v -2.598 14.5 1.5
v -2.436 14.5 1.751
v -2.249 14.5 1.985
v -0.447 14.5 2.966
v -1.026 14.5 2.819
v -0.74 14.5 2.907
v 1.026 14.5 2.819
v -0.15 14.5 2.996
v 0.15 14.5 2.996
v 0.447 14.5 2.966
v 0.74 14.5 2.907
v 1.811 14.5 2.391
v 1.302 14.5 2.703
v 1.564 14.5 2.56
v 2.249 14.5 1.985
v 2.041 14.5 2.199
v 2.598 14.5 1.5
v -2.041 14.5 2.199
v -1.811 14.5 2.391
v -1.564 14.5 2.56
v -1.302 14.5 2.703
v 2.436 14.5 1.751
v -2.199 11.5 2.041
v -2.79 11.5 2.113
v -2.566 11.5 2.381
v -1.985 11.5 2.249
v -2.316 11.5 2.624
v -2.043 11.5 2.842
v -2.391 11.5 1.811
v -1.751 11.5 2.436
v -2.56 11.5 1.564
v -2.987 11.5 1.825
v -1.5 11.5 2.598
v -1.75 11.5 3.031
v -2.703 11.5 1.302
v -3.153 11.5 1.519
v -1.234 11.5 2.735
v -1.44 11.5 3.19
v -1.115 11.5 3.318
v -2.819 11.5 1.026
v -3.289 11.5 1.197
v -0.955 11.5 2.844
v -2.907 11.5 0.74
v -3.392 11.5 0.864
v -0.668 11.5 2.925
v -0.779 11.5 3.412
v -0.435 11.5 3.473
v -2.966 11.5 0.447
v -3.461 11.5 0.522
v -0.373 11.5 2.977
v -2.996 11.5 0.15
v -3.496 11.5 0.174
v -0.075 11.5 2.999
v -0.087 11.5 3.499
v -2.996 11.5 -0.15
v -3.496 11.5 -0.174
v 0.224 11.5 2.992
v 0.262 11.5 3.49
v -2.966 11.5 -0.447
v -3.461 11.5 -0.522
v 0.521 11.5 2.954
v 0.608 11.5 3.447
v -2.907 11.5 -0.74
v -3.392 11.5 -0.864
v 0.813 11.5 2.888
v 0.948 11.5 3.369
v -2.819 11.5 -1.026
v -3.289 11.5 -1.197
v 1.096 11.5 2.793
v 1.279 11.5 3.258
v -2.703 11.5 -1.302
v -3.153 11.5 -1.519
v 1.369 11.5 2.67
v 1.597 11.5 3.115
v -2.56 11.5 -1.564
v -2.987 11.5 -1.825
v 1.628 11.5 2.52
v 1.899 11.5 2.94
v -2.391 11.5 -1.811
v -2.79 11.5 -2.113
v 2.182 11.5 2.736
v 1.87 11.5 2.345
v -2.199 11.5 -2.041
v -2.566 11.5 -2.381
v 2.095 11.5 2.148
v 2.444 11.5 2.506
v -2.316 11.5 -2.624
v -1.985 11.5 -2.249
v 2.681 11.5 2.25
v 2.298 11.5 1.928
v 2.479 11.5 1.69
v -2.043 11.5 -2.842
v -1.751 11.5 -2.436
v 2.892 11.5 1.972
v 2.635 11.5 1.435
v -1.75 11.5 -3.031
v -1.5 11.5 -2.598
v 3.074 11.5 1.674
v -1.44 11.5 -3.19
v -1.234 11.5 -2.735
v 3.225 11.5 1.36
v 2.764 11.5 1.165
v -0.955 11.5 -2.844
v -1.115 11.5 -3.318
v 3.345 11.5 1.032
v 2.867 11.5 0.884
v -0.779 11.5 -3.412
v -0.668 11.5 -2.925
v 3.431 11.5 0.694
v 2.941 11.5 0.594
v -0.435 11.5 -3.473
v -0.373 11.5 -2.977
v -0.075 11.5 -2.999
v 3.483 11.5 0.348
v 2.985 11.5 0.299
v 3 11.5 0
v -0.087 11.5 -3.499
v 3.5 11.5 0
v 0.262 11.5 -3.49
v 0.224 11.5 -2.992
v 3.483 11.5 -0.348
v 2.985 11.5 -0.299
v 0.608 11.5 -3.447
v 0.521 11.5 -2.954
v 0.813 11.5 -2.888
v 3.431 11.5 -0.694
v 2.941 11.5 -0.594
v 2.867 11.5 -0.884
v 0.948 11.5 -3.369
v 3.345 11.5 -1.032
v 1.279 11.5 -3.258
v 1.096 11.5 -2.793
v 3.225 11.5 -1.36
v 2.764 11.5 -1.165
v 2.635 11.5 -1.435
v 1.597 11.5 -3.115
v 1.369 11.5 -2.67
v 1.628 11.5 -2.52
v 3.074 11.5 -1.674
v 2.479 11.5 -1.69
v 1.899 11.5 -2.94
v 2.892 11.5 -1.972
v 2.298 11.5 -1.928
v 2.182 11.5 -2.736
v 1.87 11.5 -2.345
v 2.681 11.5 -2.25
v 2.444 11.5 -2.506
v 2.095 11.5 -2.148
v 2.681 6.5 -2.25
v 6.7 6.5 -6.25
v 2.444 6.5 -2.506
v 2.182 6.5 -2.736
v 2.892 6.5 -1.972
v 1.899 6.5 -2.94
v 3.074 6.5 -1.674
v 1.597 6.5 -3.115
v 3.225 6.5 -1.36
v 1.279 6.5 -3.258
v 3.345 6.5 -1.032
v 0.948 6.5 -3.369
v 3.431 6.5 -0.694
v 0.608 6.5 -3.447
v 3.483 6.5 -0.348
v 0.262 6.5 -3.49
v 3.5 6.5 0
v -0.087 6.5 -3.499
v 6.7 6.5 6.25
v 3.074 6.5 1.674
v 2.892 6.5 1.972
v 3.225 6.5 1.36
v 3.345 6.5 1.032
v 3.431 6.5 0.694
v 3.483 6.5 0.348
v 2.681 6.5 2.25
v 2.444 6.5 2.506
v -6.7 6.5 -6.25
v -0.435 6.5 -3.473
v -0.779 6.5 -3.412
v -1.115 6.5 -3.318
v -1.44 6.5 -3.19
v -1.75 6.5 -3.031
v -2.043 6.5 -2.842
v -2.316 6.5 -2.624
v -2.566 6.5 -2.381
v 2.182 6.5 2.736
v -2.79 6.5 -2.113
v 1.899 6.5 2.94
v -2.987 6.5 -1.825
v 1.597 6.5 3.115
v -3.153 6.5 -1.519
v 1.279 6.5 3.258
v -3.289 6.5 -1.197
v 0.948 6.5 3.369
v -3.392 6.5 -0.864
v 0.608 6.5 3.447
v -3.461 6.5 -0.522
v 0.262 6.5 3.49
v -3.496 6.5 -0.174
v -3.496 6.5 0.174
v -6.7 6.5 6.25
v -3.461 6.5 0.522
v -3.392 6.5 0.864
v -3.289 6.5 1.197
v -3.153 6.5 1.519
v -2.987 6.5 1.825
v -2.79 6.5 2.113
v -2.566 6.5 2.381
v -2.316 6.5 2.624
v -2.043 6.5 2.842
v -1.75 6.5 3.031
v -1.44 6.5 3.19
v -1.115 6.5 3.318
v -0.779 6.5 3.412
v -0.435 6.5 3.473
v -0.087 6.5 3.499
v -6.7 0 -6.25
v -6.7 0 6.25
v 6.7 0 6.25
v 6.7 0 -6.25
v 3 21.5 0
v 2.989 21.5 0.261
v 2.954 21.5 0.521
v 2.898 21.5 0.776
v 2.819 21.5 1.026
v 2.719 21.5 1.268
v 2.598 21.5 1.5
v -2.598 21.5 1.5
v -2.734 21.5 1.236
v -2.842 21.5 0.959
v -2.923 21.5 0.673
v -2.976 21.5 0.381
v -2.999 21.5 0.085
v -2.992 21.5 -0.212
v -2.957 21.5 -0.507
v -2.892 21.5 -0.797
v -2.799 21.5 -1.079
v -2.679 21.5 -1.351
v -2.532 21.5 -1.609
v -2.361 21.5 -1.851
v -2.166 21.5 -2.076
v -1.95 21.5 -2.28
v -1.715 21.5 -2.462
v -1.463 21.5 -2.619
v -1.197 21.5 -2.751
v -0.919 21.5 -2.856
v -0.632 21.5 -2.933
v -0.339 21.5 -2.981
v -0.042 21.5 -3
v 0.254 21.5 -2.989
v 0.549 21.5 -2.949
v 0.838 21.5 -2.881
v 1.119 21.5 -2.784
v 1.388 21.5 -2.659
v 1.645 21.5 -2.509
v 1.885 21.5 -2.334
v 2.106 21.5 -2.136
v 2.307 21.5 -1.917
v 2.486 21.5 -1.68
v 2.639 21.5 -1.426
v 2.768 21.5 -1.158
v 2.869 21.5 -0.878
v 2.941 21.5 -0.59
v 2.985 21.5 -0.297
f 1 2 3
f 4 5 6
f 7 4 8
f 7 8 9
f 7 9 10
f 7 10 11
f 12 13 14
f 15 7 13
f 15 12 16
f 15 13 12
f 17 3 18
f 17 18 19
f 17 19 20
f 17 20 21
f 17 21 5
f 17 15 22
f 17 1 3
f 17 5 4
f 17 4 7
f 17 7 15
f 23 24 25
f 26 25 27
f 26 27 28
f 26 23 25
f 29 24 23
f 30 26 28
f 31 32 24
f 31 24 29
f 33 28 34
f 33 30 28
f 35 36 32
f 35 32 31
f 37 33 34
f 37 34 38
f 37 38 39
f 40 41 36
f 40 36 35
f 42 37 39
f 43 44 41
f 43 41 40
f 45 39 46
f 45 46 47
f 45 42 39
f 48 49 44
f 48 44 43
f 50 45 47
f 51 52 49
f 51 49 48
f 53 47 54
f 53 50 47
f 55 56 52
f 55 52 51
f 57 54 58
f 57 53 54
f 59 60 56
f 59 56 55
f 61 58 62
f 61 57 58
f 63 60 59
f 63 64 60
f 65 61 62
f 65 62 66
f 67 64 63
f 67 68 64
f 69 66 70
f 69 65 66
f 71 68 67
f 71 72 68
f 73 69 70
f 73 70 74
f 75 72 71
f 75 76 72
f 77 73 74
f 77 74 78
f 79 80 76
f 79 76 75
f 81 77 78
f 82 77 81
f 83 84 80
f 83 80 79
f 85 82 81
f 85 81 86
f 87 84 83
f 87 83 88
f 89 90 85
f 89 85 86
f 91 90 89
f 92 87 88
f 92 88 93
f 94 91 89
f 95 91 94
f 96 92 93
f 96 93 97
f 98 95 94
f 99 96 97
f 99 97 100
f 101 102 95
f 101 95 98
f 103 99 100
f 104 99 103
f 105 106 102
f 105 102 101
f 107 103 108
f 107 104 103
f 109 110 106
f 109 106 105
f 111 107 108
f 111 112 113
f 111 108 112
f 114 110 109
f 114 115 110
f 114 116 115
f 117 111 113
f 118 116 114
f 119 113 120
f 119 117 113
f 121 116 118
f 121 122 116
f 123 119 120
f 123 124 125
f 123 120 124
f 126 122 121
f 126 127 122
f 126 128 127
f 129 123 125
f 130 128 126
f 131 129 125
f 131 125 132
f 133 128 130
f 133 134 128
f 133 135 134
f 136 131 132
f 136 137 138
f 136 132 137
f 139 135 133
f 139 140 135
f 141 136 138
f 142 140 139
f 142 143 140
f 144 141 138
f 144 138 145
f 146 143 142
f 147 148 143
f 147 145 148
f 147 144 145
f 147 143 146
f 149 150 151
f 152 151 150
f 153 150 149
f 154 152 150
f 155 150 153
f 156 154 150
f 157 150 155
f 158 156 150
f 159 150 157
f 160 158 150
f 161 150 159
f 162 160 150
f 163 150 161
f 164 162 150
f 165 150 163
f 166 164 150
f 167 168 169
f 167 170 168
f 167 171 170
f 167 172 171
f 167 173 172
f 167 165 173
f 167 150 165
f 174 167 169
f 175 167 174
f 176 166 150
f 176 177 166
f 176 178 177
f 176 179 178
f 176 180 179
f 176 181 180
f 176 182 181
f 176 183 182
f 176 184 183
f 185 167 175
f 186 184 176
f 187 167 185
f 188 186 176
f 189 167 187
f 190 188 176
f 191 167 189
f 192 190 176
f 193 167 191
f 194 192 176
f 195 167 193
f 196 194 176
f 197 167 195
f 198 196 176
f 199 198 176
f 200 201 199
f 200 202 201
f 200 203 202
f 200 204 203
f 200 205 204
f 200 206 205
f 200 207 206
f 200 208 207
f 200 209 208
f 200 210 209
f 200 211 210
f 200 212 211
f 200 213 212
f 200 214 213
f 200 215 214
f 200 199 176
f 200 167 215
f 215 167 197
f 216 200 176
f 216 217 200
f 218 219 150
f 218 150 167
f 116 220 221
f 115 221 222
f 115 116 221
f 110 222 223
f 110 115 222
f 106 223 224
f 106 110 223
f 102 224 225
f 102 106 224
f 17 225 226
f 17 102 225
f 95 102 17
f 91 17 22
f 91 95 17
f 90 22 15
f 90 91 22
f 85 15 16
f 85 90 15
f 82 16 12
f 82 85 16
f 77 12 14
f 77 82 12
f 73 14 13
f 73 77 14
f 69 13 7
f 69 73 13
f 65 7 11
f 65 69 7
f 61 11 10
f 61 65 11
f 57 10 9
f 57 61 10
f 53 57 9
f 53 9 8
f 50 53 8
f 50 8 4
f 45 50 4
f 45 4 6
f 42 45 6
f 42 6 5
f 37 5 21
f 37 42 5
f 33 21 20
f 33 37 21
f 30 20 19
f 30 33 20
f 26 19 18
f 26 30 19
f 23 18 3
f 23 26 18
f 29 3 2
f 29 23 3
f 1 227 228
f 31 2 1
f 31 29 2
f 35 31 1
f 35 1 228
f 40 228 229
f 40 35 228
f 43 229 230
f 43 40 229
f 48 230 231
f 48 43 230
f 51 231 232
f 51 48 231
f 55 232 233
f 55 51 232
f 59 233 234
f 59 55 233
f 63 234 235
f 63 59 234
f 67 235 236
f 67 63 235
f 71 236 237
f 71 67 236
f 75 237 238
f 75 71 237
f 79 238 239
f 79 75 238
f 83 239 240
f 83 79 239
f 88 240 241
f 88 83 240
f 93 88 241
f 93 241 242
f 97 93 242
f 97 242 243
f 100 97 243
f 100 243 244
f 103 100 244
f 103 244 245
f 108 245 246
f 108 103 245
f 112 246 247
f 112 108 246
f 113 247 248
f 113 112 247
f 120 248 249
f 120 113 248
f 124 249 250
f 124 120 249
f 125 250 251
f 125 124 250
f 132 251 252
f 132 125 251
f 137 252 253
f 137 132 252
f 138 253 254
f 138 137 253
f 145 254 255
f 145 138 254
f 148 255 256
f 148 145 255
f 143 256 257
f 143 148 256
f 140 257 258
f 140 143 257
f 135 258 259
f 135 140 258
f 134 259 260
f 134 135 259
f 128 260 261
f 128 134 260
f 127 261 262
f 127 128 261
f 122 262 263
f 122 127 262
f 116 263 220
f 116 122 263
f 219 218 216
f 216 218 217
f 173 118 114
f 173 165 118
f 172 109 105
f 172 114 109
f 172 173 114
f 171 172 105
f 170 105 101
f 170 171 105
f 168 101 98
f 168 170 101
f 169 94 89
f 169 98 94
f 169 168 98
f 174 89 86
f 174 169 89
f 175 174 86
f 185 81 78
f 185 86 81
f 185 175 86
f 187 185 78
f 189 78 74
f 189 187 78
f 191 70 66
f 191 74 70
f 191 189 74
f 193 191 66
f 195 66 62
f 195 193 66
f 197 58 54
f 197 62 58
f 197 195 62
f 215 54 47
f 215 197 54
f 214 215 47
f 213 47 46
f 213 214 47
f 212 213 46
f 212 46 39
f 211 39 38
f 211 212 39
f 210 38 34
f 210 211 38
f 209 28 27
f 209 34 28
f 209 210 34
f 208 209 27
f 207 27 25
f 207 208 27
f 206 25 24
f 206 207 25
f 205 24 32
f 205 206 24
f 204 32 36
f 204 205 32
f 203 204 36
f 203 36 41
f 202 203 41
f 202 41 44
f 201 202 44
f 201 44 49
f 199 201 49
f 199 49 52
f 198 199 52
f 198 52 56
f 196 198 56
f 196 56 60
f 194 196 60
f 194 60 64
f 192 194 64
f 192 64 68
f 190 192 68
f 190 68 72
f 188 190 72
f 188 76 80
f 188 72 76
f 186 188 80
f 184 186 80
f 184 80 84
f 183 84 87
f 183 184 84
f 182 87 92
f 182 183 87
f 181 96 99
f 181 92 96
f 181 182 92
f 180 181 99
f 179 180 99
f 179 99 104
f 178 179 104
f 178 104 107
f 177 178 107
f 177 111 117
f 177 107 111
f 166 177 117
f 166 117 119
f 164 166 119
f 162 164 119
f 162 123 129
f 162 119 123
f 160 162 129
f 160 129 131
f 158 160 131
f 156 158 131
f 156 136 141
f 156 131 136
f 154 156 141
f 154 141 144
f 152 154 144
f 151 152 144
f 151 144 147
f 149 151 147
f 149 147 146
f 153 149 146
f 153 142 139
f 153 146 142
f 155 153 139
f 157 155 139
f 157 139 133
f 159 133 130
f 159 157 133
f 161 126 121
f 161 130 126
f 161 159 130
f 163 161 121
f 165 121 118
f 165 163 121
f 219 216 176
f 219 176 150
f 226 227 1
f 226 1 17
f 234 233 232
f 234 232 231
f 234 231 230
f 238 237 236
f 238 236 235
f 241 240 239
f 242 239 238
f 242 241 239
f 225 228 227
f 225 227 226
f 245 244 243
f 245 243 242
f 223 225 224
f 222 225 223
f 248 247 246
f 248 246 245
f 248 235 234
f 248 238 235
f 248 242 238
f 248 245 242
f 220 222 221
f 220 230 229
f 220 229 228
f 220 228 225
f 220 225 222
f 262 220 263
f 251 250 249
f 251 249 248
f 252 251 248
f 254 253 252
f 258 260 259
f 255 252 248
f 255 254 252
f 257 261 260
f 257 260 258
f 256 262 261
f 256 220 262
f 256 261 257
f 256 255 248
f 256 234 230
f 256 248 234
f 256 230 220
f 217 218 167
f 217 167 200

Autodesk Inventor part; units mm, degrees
ref_plane "YZ Plane" through (0, 0, 0) normal (1, 0, 0) x (0, 1, 0)
ref_plane "XZ Plane" through (0, 0, 0) normal (0, 1, 0) x (-1, 0, 0)
ref_plane "XY Plane" through (0, 0, 0) normal (0, 0, 1) x (1, 0, 0)
sketch "Sketch1" plane through (0, 0, 0) normal (0, 1, 0) x (-1, 0, 0)
  line L0 (-6.7, 6.25) -> (6.7, 6.25)
  line L1 (6.7, 6.25) -> (6.7, -6.25)
  line L2 (6.7, -6.25) -> (-6.7, -6.25)
  line L3 (-6.7, -6.25) -> (-6.7, 6.25)
  line L4 (-6.7, 6.25) -> (6.7, -6.25) construction
  line L5 (6.7, 6.25) -> (-6.7, -6.25) construction
  point P0 (0, 0)
  dimension "d0" = 13.4
  dimension "d1" = 12.5
extrude "Extrusion1" add sketch "Sketch1" along normal blind 6.5
sketch "Sketch2" plane through (0, 6.5, 0) normal (0, 1, 0) x (1, 0, 0)
  circle A0 centre (0, 0) radius 3.5
  dimension "d4" = 7
extrude "Extrusion2" add sketch "Sketch2" along normal blind 5
sketch "Sketch3" plane through (0, 11.5, 0) normal (0, 1, 0) x (1, 0, 0)
  circle A0 centre (0, 0) radius 3
  dimension "d7" = 6
extrude "Extrusion3" add sketch "Sketch3" along normal blind 10
sketch "Sketch4" plane through (0, 21.5, 0) normal (0, 1, 0) x (1, 0, 0)
  line L0 (0, -1.5) -> (2.5981, -1.5)
  circle A0 centre (0, 0) radius 3 projected
  line L1 (0, -1.5) -> (-2.5981, -1.5)
  arc A1 (-2.5981, -1.5) -> (2.5981, -1.5) centre (0, 0) ccw
  dimension "d10" = 1.5
extrude "Extrusion4" cut sketch "Sketch4" against normal blind 7 contours L0 A0 L1 picked at (-1.5934, -1.6862)
thread "Thread1" size "M7x1" class "6g" standard "ISO Metric profile" full length
properties part number "PEC11R-4215F-S0024"
